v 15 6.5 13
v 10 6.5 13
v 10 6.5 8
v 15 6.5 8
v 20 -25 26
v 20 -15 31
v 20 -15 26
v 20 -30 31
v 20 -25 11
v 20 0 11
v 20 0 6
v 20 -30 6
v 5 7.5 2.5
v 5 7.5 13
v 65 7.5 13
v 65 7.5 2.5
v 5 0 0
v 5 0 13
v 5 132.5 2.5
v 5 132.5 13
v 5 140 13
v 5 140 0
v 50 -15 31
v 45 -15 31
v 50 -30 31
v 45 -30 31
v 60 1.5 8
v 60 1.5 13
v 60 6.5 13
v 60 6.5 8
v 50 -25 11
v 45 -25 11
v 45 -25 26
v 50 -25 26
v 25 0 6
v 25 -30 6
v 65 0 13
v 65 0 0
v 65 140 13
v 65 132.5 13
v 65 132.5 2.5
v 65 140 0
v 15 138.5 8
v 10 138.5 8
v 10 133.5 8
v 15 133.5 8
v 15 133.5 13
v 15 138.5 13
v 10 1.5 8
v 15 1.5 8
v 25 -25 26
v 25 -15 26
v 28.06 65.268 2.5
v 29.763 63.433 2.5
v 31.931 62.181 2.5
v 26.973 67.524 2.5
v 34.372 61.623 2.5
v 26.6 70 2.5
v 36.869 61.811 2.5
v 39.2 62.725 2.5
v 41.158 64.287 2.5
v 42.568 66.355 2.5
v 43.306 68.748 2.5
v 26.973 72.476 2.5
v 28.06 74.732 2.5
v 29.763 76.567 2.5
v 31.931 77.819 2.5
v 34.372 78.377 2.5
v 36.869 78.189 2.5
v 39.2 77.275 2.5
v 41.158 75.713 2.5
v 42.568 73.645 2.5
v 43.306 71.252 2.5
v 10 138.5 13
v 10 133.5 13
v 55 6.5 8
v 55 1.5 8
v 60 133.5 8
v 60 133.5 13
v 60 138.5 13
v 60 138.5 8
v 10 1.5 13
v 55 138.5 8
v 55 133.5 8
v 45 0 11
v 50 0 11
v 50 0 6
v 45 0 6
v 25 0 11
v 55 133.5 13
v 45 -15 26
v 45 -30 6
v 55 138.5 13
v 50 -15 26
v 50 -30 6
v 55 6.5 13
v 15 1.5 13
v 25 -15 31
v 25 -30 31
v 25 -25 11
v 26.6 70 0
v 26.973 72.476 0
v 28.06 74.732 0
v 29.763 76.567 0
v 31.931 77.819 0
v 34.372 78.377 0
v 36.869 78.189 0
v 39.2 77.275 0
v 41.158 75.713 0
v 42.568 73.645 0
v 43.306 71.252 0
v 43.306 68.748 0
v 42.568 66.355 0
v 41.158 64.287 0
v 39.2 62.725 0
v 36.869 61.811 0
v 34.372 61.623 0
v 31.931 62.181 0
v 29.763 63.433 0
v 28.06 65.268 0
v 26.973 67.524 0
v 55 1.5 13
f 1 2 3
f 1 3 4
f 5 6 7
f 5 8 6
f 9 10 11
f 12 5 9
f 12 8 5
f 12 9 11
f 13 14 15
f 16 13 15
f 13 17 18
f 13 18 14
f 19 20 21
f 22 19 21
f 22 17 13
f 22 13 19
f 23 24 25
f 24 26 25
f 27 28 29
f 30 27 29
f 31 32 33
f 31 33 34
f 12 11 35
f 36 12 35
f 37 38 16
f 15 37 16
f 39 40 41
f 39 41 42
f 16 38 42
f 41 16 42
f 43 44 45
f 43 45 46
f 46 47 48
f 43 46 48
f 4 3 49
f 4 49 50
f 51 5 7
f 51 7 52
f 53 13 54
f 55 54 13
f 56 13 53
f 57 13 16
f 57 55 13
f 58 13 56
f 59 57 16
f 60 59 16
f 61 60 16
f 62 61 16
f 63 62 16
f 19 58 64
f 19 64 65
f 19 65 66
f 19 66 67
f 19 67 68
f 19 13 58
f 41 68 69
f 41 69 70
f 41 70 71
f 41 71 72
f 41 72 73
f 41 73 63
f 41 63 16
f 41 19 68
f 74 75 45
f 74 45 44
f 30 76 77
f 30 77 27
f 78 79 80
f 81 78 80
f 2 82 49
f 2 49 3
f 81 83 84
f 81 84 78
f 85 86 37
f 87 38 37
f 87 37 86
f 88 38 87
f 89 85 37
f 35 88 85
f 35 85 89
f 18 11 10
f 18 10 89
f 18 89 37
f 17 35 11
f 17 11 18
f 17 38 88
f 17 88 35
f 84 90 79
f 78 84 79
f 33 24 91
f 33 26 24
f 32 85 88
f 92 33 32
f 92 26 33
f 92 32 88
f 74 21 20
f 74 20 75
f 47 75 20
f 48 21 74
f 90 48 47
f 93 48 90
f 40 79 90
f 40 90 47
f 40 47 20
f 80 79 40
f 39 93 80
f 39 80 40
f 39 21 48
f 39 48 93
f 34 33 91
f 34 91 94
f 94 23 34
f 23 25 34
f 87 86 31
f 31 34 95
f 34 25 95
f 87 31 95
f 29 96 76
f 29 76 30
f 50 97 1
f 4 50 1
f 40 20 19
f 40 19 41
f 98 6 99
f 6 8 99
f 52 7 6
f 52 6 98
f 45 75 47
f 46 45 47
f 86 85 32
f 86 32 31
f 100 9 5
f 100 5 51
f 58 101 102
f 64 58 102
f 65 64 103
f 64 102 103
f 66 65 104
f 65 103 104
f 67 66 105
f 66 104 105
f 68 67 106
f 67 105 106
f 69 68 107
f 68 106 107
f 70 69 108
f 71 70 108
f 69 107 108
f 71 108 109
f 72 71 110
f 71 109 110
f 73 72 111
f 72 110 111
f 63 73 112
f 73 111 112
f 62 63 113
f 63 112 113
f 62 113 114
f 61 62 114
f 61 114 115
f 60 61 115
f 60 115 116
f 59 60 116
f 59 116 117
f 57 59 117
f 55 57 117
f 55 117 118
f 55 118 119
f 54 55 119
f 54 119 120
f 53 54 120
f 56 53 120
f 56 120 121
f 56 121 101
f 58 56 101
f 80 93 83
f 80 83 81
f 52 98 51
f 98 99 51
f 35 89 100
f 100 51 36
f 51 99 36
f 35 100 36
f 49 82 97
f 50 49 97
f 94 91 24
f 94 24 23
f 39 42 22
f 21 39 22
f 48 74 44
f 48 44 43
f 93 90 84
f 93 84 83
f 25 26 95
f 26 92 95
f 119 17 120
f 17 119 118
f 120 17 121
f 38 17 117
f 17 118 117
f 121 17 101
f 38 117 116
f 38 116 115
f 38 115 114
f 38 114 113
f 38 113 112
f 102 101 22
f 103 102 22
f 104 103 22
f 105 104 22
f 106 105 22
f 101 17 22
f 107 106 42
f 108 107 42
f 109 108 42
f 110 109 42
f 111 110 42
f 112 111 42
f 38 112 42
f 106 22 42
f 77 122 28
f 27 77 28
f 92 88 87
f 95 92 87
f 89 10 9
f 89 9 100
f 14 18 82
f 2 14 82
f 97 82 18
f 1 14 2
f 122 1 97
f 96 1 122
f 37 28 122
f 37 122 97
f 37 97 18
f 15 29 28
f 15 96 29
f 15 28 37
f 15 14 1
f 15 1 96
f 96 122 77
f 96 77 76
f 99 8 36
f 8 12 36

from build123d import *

# Parameters (mm, degrees)
SKETCH2_W           = 70
SKETCH2_H           = 140
BOSS_EXTRUDE1_DEPTH = 15
SKETCH7_W           = 70
SKETCH7_H           = 125
CUT_EXTRUDE4_DEPTH  = 12.5
SKETCH8_W           = 5
SKETCH8_H           = 5
CUT_EXTRUDE5_DEPTH  = 7
SKETCH6_R           = 8.4
CUT_EXTRUDE2_DEPTH  = 16
SKETCH9_OUTSIDE_W   = 103.448
SKETCH9_OUTSIDE_H   = 173.448
SKETCH9_OUTSIDE_W_2 = 60
SKETCH9_OUTSIDE_H_2 = 140
CUT_EXTRUDE6_DEPTH  = 15
SKETCH10_W          = 60
SKETCH10_H          = 2
CUT_EXTRUDE7_DEPTH  = 140
SKETCH11_W          = 5
SKETCH11_H          = 5
BOSS_EXTRUDE2_DEPTH = 30
SKETCH12_W          = 5
SKETCH12_H          = 5
BOSS_EXTRUDE3_DEPTH = 20
SKETCH13_W          = 5
SKETCH13_H          = 5
BOSS_EXTRUDE4_DEPTH = 10
SKETCH15_W          = 5
SKETCH15_H          = 5
BOSS_EXTRUDE5_DEPTH = 20
SKETCH16_W          = 5
SKETCH16_H          = 5
BOSS_EXTRUDE6_DEPTH = 10


with BuildPart() as part:
    # Sketch2 → Boss-Extrude1 (new body)
    with BuildSketch(Plane.XY):
        with Locations((35, 70)):
            Rectangle(SKETCH2_W, SKETCH2_H)
    extrude(amount=BOSS_EXTRUDE1_DEPTH)

    # Sketch7 → Cut-Extrude4 (cut)
    with BuildSketch(Plane.XY.offset(15)):
        with Locations((35, 70)):
            Rectangle(SKETCH7_W, SKETCH7_H)
    extrude(amount=-CUT_EXTRUDE4_DEPTH, mode=Mode.SUBTRACT)

    # Sketch8 → Cut-Extrude5 (cut)
    with BuildSketch(Plane.XY.offset(15)):
        with Locations((12.5, 136)):
            Rectangle(SKETCH8_W, SKETCH8_H)
        with Locations((57.5, 136)):
            Rectangle(SKETCH8_W, SKETCH8_H)
        with Locations((12.5, 4)):
            Rectangle(SKETCH8_W, SKETCH8_H)
        with Locations((57.5, 4)):
            Rectangle(SKETCH8_W, SKETCH8_H)
    extrude(amount=-CUT_EXTRUDE5_DEPTH, mode=Mode.SUBTRACT)

    # Sketch6 → Cut-Extrude2 (cut, through all)
    with BuildSketch(Plane(origin=(0, 0, 0), x_dir=(-1, 0, 0), z_dir=(0, 0, -1))):
        with Locations((-35, 70)):
            Circle(SKETCH6_R)
    extrude(amount=-CUT_EXTRUDE2_DEPTH, mode=Mode.SUBTRACT)

    # Sketch9 outside → Cut-Extrude6 (cut)
    with BuildSketch(Plane(origin=(0, 0, 0), x_dir=(-1, 0, 0), z_dir=(0, 0, -1))):
        with Locations((-35, 70)):
            Rectangle(SKETCH9_OUTSIDE_W, SKETCH9_OUTSIDE_H)
        with Locations((-35, 70)):
            Rectangle(SKETCH9_OUTSIDE_W_2, SKETCH9_OUTSIDE_H_2, mode=Mode.SUBTRACT)
    extrude(amount=-CUT_EXTRUDE6_DEPTH, mode=Mode.SUBTRACT)

    # Sketch10 → Cut-Extrude7 (cut)
    with BuildSketch(Plane(origin=(0, 140, 0), x_dir=(1, 0, 0), z_dir=(0, 1, 0))):
        with Locations((35, -14)):
            Rectangle(SKETCH10_W, SKETCH10_H)
    extrude(amount=-CUT_EXTRUDE7_DEPTH, mode=Mode.SUBTRACT)

    # Sketch11 → Boss-Extrude2 (add)
    with BuildSketch(Plane.XZ):
        with Locations((47.5, 8.5)):
            Rectangle(SKETCH11_W, SKETCH11_H)
        with Locations((22.5, 8.5)):
            Rectangle(SKETCH11_W, SKETCH11_H)
    extrude(amount=BOSS_EXTRUDE2_DEPTH)

    # Sketch12 → Boss-Extrude3 (add)
    with BuildSketch(Plane.XY.offset(11)):
        with Locations((22.5, -27.5)):
            Rectangle(SKETCH12_W, SKETCH12_H)
    extrude(amount=BOSS_EXTRUDE3_DEPTH)

    # Sketch13 → Boss-Extrude4 (add)
    with BuildSketch(Plane(origin=(0, -25, 0), x_dir=(1, 0, 0), z_dir=(0, 1, 0))):
        with Locations((22.5, -28.5)):
            Rectangle(SKETCH13_W, SKETCH13_H)
    extrude(amount=BOSS_EXTRUDE4_DEPTH)

    # Sketch15 → Boss-Extrude5 (add)
    with BuildSketch(Plane.XY.offset(11)):
        with Locations((47.5, -27.5)):
            Rectangle(SKETCH15_W, SKETCH15_H)
    extrude(amount=BOSS_EXTRUDE5_DEPTH)

    # Sketch16 → Boss-Extrude6 (add)
    with BuildSketch(Plane(origin=(0, -25, 0), x_dir=(1, 0, 0), z_dir=(0, 1, 0))):
        with Locations((47.5, -28.5)):
            Rectangle(SKETCH16_W, SKETCH16_H)
    extrude(amount=BOSS_EXTRUDE6_DEPTH)


solid = part.part
